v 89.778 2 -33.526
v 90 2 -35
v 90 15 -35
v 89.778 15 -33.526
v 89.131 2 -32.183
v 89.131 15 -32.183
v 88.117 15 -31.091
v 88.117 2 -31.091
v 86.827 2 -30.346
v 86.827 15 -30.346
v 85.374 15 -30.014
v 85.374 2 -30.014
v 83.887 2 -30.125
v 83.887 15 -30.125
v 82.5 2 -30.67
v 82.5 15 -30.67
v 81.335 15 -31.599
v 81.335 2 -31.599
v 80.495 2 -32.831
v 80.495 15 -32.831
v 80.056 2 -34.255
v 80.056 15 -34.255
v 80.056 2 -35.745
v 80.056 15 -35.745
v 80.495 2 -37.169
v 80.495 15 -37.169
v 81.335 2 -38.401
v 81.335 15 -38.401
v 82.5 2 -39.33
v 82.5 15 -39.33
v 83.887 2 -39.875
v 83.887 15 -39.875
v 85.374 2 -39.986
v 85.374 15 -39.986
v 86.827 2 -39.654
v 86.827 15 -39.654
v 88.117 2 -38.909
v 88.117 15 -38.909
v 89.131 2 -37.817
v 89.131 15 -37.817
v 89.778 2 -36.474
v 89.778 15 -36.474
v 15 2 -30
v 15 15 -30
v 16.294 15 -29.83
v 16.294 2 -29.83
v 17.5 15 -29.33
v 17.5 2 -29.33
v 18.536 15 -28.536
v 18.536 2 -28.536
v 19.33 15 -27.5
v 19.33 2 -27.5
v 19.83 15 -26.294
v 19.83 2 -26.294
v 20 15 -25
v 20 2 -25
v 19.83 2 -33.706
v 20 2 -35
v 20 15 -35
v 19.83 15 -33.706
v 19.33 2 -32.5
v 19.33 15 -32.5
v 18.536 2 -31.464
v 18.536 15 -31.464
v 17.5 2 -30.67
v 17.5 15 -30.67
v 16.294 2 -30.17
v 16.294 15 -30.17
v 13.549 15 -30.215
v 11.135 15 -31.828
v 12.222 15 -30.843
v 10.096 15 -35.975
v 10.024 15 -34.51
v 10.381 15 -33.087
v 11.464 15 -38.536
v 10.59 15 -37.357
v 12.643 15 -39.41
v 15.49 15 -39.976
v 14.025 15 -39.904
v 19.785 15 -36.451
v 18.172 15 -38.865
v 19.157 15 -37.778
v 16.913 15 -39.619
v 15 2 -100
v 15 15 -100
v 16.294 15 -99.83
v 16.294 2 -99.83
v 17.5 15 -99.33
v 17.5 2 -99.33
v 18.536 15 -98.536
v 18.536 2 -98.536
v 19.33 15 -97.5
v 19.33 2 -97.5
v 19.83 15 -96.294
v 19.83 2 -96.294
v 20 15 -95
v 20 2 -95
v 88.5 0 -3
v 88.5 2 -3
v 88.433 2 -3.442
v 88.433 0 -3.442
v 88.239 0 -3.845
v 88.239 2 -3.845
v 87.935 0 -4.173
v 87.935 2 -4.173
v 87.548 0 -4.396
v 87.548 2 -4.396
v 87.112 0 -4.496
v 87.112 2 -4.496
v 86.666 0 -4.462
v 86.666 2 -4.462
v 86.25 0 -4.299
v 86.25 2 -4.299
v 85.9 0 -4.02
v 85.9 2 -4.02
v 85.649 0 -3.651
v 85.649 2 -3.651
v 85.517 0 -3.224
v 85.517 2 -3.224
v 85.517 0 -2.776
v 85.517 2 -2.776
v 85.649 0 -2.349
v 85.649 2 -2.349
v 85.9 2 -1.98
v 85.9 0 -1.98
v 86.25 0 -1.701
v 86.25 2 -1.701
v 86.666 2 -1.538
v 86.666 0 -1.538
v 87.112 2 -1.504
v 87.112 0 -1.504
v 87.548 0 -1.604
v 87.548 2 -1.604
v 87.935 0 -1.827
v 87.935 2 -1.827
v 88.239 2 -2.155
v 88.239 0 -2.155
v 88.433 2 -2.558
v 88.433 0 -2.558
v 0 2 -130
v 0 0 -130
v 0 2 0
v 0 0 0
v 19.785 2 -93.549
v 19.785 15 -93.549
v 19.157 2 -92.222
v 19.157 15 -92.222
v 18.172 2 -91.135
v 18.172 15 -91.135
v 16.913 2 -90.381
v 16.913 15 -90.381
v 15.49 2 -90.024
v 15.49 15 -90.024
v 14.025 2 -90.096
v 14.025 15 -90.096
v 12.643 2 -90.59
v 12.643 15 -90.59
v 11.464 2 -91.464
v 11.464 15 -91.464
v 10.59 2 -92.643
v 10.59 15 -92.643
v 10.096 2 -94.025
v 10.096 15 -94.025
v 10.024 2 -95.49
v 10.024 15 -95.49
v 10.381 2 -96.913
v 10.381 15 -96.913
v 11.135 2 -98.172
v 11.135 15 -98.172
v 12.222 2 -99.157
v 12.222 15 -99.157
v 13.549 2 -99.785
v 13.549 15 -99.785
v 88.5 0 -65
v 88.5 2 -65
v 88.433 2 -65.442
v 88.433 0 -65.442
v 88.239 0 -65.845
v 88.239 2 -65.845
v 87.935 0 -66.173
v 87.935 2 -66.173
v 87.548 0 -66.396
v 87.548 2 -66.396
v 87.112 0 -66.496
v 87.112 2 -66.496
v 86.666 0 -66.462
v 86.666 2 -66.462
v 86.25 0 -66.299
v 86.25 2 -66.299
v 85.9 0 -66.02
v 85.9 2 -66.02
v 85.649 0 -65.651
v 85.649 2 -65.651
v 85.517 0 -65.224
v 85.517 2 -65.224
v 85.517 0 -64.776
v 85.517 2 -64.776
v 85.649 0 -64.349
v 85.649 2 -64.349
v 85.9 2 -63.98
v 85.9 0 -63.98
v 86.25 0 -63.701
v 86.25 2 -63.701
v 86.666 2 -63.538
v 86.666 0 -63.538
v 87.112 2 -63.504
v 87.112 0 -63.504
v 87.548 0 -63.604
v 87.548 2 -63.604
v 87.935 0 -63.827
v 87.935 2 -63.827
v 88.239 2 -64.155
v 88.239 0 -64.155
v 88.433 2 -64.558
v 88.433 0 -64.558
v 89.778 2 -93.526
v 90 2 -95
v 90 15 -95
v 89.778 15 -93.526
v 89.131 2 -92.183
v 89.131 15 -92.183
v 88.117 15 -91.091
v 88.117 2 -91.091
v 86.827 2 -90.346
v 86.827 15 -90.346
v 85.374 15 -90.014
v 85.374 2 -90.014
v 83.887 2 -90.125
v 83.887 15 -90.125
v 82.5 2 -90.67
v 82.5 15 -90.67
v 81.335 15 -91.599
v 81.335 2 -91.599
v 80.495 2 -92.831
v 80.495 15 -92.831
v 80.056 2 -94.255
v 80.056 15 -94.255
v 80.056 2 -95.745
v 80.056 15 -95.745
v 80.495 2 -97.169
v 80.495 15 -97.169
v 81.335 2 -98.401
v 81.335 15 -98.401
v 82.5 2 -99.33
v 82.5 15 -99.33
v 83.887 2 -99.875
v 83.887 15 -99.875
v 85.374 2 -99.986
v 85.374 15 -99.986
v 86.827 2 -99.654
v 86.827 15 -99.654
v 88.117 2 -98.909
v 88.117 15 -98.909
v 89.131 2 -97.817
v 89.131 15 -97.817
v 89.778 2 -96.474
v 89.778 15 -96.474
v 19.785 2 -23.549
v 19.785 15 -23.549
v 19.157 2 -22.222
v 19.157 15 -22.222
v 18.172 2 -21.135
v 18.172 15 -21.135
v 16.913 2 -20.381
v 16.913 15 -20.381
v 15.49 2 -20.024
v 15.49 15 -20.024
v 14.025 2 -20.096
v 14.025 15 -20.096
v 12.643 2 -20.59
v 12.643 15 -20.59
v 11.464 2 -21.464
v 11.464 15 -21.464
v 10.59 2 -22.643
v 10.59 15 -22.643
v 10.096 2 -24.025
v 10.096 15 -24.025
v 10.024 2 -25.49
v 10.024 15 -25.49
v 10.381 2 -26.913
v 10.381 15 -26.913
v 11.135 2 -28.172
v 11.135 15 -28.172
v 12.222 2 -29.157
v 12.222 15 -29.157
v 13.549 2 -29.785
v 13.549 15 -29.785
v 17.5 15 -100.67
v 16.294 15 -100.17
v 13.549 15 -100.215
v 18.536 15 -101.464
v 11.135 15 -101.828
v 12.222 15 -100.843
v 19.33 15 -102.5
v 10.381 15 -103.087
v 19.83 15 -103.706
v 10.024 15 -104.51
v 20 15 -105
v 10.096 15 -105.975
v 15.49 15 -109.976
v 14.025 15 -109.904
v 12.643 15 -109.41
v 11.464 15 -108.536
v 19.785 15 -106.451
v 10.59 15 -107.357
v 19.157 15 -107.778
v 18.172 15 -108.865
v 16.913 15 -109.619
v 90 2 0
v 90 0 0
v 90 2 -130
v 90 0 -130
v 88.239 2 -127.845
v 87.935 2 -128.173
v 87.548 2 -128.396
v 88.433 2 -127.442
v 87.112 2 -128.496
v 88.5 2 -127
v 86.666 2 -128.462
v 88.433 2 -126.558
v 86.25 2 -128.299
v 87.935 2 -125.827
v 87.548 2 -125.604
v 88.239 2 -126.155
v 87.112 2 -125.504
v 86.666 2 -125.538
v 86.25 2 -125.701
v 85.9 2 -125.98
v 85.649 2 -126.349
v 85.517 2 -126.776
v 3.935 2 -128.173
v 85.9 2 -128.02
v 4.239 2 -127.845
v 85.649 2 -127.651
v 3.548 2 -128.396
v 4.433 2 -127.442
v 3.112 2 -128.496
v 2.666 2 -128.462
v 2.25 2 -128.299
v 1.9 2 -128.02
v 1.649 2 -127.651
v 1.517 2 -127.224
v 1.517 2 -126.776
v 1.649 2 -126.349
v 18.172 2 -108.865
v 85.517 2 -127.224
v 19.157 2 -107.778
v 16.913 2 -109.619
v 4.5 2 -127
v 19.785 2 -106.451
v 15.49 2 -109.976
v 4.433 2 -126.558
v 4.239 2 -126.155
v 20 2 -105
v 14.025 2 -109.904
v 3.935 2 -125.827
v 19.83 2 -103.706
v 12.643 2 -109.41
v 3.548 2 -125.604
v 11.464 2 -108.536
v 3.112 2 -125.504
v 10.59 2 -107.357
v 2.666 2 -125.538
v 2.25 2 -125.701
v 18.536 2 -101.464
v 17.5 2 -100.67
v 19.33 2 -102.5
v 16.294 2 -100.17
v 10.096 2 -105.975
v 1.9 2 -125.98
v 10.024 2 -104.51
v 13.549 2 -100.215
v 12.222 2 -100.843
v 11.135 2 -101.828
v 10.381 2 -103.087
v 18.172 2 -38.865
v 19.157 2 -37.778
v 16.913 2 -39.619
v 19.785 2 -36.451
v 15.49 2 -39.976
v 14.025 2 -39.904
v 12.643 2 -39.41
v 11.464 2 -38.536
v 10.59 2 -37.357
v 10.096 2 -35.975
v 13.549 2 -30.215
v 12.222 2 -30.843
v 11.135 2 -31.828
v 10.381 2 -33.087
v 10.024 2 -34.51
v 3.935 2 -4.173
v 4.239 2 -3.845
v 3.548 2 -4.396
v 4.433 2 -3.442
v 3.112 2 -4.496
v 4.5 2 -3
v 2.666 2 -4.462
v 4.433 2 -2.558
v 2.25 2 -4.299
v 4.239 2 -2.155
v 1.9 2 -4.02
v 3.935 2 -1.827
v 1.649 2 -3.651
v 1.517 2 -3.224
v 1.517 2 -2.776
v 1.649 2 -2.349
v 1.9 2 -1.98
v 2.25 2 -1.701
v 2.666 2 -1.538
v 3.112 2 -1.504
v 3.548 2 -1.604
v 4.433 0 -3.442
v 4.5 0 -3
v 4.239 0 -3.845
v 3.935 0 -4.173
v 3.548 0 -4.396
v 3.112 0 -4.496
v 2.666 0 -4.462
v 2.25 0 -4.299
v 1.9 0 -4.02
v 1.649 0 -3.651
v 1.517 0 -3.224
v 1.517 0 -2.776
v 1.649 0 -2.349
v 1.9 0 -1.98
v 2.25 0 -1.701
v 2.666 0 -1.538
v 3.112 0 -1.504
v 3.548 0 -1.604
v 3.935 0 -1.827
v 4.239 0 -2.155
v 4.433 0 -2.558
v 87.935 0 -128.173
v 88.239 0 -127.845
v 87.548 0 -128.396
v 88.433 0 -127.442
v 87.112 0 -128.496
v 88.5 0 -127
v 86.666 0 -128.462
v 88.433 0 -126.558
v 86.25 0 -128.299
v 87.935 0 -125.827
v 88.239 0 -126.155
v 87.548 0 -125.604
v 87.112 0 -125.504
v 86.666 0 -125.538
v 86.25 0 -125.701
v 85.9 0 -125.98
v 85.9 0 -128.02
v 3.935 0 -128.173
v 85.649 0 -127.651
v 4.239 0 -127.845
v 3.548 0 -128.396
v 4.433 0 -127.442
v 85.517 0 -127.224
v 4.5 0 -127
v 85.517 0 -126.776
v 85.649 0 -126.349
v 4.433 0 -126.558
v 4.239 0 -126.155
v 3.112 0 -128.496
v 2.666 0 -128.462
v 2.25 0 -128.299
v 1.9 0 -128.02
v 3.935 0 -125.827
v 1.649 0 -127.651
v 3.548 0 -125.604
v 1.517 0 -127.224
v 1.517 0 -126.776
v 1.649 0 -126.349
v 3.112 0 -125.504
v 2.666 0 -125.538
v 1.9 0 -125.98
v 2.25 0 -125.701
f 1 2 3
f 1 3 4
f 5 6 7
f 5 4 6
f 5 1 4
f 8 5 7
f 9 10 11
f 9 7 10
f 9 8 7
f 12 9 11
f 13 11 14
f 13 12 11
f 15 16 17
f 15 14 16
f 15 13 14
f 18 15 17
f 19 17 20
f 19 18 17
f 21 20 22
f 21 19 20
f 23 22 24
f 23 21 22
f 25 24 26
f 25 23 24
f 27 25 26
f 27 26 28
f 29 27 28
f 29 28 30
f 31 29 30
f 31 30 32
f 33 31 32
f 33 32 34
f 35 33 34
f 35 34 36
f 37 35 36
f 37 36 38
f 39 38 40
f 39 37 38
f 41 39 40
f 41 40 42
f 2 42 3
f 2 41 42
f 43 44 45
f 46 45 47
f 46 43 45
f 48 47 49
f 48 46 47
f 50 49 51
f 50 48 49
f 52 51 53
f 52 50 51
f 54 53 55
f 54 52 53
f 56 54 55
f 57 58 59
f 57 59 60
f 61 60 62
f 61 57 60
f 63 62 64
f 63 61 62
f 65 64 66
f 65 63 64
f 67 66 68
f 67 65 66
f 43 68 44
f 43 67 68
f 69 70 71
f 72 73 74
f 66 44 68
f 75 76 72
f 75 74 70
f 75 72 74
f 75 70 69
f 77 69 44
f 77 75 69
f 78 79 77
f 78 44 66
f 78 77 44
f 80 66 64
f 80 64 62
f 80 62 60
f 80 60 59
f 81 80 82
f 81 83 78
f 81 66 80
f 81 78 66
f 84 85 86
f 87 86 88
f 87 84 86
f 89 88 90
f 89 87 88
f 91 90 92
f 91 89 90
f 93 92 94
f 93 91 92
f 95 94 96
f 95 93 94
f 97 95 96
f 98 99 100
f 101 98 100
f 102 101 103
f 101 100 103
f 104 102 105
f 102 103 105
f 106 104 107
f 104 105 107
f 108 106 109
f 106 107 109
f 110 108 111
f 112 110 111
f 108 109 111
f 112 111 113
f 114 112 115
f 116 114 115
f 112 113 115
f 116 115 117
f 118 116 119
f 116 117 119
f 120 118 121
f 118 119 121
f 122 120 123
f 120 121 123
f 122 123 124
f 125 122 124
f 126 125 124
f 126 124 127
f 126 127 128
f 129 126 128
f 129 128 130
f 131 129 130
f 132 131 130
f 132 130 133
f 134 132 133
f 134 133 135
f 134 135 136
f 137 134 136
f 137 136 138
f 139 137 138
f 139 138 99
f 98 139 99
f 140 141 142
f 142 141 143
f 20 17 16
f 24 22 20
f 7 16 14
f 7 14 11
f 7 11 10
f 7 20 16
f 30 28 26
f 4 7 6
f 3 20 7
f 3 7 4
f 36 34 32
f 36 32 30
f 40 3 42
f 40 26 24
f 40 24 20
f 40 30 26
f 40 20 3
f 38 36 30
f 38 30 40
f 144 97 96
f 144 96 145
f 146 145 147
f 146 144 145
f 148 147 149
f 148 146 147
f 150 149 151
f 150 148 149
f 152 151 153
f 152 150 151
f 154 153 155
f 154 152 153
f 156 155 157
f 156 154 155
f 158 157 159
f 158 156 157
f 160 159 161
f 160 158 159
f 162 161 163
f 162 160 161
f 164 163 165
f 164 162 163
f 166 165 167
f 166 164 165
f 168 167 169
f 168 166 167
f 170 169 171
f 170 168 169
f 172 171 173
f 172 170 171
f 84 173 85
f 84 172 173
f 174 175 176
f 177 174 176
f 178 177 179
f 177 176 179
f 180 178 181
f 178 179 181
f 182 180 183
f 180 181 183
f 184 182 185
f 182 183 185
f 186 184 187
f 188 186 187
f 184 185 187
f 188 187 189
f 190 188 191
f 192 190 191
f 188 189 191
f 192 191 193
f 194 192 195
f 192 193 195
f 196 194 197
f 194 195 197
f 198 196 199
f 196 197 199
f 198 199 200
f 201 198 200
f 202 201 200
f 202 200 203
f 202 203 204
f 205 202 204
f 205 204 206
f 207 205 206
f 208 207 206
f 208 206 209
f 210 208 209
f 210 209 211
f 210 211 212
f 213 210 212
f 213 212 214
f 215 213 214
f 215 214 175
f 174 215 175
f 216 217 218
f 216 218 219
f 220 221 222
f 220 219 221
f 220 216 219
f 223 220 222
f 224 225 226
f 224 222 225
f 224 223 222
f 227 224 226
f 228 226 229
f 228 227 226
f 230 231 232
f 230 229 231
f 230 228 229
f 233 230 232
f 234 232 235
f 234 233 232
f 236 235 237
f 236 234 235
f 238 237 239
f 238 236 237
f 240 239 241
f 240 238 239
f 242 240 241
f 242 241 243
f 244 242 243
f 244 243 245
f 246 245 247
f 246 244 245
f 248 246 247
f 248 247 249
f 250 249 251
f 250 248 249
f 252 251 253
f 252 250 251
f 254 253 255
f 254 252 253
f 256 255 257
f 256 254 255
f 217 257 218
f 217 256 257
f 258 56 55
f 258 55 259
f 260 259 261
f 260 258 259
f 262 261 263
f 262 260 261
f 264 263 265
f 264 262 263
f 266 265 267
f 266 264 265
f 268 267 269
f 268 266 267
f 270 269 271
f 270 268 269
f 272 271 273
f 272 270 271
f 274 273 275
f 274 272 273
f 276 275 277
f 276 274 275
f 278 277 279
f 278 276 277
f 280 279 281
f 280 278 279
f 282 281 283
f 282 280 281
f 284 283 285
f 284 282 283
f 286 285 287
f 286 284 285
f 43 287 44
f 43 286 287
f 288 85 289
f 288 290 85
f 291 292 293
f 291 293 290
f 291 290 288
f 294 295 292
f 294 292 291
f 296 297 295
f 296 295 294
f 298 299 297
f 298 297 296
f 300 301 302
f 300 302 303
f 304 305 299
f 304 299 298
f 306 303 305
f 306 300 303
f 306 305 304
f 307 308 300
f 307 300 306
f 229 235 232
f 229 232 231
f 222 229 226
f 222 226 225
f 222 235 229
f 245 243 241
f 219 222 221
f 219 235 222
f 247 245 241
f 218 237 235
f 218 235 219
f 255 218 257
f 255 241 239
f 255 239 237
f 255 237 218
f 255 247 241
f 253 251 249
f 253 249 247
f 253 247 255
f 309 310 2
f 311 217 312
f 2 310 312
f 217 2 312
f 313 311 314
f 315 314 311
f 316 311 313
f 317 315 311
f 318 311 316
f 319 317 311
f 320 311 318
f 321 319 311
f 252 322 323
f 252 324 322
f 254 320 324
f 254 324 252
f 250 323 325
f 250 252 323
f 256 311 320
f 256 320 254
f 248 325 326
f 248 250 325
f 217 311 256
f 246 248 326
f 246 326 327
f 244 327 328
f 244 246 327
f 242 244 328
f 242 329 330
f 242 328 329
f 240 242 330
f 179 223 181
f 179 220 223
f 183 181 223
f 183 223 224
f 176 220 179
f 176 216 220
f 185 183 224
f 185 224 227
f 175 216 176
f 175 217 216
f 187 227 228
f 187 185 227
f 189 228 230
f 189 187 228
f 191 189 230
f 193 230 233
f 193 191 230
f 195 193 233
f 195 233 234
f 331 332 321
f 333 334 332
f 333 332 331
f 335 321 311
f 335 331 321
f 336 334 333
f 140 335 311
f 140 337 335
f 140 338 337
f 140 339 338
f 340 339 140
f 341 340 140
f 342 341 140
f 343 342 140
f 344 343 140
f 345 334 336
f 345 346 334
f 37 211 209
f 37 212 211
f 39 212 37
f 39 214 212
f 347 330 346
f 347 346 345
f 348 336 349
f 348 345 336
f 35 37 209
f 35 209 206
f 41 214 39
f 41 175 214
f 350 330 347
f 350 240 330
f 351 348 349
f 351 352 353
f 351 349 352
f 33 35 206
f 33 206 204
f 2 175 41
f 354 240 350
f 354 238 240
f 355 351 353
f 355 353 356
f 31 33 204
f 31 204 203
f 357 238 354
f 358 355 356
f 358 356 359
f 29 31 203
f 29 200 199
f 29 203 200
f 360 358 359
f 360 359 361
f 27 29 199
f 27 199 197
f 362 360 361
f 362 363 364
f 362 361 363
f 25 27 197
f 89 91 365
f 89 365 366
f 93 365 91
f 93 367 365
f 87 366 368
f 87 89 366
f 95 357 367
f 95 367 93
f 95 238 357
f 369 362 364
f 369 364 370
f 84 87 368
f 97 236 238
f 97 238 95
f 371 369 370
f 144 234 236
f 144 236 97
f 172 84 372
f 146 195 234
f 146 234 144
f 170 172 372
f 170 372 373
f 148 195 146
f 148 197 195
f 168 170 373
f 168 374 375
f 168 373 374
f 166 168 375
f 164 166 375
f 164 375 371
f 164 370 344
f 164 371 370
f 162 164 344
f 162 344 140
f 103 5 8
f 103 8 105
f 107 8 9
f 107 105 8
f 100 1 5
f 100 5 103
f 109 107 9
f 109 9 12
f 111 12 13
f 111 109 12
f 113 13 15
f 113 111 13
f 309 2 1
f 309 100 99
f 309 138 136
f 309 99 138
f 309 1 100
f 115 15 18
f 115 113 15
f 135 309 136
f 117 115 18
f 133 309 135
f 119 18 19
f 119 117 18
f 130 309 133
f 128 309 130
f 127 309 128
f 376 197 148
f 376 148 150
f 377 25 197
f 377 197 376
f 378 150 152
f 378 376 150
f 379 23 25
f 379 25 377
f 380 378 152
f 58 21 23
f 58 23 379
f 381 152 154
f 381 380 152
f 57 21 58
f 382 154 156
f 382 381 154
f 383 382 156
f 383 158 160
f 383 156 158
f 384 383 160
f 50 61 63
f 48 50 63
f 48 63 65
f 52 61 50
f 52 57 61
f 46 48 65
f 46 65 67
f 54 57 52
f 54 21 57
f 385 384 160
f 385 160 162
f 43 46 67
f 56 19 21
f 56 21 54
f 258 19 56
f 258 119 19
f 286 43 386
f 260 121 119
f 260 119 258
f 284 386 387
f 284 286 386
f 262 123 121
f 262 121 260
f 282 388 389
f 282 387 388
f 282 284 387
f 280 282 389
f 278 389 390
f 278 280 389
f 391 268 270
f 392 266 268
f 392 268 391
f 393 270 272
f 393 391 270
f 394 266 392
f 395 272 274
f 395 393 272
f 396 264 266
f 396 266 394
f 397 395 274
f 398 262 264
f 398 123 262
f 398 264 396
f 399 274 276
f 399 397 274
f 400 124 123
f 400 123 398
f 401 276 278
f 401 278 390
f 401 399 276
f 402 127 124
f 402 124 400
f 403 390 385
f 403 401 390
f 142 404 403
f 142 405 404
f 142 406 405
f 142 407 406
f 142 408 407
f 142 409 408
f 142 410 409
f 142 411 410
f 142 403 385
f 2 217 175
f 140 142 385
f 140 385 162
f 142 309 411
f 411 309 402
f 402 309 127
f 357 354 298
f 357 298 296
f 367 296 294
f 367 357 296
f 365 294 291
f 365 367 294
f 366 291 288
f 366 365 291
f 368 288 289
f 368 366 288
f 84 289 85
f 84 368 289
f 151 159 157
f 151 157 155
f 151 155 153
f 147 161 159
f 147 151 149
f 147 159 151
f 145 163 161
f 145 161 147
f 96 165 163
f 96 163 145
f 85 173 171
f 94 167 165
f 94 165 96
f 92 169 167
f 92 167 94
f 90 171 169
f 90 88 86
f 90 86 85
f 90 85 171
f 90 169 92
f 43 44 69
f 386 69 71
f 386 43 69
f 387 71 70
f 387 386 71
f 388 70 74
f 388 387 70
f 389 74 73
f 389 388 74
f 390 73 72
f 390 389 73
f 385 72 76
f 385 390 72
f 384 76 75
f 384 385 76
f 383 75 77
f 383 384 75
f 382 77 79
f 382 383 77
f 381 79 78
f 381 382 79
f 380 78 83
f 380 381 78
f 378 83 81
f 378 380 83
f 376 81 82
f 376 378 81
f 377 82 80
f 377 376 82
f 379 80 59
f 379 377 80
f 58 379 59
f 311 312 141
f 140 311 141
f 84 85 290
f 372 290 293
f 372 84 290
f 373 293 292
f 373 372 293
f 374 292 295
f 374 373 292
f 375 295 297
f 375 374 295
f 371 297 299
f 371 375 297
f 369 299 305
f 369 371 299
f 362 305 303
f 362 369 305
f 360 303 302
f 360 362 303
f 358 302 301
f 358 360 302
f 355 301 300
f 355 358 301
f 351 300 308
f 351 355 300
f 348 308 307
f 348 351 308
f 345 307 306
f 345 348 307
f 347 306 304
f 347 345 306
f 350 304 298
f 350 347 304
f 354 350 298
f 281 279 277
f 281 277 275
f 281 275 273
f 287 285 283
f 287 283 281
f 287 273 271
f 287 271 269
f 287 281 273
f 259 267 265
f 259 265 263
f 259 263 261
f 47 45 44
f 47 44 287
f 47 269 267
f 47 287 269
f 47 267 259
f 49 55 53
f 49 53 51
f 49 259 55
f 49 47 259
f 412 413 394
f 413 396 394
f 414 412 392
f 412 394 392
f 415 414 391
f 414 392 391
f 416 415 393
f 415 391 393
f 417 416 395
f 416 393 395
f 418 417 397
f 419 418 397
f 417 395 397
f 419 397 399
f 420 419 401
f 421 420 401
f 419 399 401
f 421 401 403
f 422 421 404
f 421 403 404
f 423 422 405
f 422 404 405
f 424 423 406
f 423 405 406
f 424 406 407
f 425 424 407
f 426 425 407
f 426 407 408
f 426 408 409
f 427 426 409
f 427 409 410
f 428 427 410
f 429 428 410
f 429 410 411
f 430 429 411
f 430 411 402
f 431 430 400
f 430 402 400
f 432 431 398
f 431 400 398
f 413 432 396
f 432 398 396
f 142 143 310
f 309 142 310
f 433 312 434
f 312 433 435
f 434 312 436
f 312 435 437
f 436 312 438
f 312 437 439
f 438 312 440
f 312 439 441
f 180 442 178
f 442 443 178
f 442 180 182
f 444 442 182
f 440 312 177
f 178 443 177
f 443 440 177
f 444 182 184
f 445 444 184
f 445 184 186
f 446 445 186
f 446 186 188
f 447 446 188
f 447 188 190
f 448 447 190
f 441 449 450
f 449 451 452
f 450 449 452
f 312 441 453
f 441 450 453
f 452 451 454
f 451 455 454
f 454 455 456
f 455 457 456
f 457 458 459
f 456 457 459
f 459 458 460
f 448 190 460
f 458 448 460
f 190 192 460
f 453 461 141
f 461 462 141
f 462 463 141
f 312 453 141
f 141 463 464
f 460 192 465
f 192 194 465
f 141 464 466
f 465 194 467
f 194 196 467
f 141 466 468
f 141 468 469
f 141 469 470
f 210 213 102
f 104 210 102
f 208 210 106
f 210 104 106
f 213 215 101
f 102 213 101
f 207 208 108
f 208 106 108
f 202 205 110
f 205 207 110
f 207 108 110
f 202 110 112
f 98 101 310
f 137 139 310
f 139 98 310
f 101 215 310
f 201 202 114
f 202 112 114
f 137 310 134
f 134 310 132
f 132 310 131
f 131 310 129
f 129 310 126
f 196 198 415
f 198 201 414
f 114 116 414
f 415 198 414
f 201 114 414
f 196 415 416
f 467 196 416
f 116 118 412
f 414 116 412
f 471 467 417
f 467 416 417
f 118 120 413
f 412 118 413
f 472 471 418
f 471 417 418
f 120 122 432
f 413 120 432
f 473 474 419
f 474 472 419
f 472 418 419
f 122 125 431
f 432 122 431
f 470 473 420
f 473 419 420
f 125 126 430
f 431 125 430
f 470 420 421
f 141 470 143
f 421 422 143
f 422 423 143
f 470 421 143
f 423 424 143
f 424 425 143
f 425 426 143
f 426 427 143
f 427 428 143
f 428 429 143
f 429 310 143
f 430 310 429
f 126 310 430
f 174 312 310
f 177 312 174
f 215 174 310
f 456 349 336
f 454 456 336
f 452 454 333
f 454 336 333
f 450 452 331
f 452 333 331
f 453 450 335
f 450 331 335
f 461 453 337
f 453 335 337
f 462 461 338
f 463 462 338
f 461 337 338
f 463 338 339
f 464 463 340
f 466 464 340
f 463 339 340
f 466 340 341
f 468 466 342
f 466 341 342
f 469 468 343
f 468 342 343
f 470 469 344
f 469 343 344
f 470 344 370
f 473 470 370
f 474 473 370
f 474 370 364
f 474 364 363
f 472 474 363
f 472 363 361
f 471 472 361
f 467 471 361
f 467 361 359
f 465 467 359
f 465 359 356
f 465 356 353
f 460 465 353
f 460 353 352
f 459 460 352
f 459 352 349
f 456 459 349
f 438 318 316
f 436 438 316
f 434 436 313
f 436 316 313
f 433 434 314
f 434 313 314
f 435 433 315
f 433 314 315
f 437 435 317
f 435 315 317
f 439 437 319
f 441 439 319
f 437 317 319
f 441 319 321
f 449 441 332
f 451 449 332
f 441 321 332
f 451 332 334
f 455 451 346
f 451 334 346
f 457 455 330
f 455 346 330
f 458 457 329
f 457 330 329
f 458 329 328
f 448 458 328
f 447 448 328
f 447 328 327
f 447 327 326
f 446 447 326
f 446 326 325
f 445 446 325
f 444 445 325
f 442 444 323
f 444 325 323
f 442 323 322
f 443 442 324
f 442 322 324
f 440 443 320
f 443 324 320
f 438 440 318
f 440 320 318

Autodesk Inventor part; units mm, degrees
ref_plane "YZ Plane" through (0, 0, 0) normal (1, 0, 0) x (0, 1, 0)
ref_plane "XZ Plane" through (0, 0, 0) normal (0, 1, 0) x (-1, 0, 0)
ref_plane "XY Plane" through (0, 0, 0) normal (0, 0, 1) x (1, 0, 0)
sketch "스케치1" plane through (0, 0, 0) normal (0, 1, 0) x (-1, 0, 0)
  line L0 (0, 0) -> (-90, 0)
  line L1 (-90, 0) -> (-90, -130)
  line L2 (-90, -130) -> (0, -130)
  line L3 (0, -130) -> (0, 0)
  dimension "d0" = 90
  dimension "d1" = 130
extrude "돌출1" add sketch "스케치1" along normal blind 2
sketch "스케치2" plane through (0, 2, 0) normal (0, 1, 0) x (1, 0, 0)
  circle A0 centre (85, 95) radius 5
  circle A1 centre (85, 35) radius 5
  line L0 (0, 0) -> (90, 0) projected
  line L1 (90, 0) -> (90, 130) projected
  line L2 (90, 130) -> (0, 130) projected
  line L3 (0, 130) -> (0, 0) projected
  circle A2 centre (15, 105) radius 5
  circle A3 centre (15, 95) radius 5
  circle A4 centre (15, 35) radius 5
  circle A5 centre (15, 25) radius 5
  dimension "d4" = 10
  dimension "d5" = 10
  dimension "d6" = 5
  dimension "d7" = 5
  dimension "d8" = 35
  dimension "d9" = 35
  dimension "d10" = 10
  dimension "d11" = 10
  dimension "d12" = 10
  dimension "d13" = 10
  dimension "d14" = 25
  dimension "d15" = 10
  dimension "d16" = 25
  dimension "d17" = 10
  dimension "d18" = 15
  dimension "d19" = 15
  dimension "d20" = 15
  dimension "d21" = 15
extrude "돌출2" add sketch "스케치2" along normal blind 13 contours A0 | A1 | A2 | A3 | A4 | A5
sketch "스케치3" plane through (0, 2, 0) normal (0, 1, 0) x (1, 0, 0)
  circle A0 centre (87, 127) radius 1.5
  circle A1 centre (87, 65) radius 1.5
  circle A2 centre (87, 3) radius 1.5
  line L0 (90, 0) -> (90, 130) projected
  line L1 (90, 130) -> (0, 130) projected
  line L2 (0, 0) -> (90, 0) projected
  circle A3 centre (3, 127) radius 1.5
  circle A4 centre (3, 3) radius 1.5
  line L3 (0, 130) -> (0, 0) projected
  dimension "d24" = 3
  dimension "d25" = 3
  dimension "d26" = 3
  dimension "d27" = 3
  dimension "d28" = 3
  dimension "d29" = 3
  dimension "d30" = 3
  dimension "d31" = 3
  dimension "d32" = 62
  dimension "d33" = 3
  dimension "d34" = 3
  dimension "d35" = 3
  dimension "d36" = 3
  dimension "d37" = 3
  dimension "d38" = 3
extrude "돌출3" cut sketch "스케치3" against normal blind 2 contours A0 | A1 | A2 | A3 | A4
properties part number "13090모터드라이브"
